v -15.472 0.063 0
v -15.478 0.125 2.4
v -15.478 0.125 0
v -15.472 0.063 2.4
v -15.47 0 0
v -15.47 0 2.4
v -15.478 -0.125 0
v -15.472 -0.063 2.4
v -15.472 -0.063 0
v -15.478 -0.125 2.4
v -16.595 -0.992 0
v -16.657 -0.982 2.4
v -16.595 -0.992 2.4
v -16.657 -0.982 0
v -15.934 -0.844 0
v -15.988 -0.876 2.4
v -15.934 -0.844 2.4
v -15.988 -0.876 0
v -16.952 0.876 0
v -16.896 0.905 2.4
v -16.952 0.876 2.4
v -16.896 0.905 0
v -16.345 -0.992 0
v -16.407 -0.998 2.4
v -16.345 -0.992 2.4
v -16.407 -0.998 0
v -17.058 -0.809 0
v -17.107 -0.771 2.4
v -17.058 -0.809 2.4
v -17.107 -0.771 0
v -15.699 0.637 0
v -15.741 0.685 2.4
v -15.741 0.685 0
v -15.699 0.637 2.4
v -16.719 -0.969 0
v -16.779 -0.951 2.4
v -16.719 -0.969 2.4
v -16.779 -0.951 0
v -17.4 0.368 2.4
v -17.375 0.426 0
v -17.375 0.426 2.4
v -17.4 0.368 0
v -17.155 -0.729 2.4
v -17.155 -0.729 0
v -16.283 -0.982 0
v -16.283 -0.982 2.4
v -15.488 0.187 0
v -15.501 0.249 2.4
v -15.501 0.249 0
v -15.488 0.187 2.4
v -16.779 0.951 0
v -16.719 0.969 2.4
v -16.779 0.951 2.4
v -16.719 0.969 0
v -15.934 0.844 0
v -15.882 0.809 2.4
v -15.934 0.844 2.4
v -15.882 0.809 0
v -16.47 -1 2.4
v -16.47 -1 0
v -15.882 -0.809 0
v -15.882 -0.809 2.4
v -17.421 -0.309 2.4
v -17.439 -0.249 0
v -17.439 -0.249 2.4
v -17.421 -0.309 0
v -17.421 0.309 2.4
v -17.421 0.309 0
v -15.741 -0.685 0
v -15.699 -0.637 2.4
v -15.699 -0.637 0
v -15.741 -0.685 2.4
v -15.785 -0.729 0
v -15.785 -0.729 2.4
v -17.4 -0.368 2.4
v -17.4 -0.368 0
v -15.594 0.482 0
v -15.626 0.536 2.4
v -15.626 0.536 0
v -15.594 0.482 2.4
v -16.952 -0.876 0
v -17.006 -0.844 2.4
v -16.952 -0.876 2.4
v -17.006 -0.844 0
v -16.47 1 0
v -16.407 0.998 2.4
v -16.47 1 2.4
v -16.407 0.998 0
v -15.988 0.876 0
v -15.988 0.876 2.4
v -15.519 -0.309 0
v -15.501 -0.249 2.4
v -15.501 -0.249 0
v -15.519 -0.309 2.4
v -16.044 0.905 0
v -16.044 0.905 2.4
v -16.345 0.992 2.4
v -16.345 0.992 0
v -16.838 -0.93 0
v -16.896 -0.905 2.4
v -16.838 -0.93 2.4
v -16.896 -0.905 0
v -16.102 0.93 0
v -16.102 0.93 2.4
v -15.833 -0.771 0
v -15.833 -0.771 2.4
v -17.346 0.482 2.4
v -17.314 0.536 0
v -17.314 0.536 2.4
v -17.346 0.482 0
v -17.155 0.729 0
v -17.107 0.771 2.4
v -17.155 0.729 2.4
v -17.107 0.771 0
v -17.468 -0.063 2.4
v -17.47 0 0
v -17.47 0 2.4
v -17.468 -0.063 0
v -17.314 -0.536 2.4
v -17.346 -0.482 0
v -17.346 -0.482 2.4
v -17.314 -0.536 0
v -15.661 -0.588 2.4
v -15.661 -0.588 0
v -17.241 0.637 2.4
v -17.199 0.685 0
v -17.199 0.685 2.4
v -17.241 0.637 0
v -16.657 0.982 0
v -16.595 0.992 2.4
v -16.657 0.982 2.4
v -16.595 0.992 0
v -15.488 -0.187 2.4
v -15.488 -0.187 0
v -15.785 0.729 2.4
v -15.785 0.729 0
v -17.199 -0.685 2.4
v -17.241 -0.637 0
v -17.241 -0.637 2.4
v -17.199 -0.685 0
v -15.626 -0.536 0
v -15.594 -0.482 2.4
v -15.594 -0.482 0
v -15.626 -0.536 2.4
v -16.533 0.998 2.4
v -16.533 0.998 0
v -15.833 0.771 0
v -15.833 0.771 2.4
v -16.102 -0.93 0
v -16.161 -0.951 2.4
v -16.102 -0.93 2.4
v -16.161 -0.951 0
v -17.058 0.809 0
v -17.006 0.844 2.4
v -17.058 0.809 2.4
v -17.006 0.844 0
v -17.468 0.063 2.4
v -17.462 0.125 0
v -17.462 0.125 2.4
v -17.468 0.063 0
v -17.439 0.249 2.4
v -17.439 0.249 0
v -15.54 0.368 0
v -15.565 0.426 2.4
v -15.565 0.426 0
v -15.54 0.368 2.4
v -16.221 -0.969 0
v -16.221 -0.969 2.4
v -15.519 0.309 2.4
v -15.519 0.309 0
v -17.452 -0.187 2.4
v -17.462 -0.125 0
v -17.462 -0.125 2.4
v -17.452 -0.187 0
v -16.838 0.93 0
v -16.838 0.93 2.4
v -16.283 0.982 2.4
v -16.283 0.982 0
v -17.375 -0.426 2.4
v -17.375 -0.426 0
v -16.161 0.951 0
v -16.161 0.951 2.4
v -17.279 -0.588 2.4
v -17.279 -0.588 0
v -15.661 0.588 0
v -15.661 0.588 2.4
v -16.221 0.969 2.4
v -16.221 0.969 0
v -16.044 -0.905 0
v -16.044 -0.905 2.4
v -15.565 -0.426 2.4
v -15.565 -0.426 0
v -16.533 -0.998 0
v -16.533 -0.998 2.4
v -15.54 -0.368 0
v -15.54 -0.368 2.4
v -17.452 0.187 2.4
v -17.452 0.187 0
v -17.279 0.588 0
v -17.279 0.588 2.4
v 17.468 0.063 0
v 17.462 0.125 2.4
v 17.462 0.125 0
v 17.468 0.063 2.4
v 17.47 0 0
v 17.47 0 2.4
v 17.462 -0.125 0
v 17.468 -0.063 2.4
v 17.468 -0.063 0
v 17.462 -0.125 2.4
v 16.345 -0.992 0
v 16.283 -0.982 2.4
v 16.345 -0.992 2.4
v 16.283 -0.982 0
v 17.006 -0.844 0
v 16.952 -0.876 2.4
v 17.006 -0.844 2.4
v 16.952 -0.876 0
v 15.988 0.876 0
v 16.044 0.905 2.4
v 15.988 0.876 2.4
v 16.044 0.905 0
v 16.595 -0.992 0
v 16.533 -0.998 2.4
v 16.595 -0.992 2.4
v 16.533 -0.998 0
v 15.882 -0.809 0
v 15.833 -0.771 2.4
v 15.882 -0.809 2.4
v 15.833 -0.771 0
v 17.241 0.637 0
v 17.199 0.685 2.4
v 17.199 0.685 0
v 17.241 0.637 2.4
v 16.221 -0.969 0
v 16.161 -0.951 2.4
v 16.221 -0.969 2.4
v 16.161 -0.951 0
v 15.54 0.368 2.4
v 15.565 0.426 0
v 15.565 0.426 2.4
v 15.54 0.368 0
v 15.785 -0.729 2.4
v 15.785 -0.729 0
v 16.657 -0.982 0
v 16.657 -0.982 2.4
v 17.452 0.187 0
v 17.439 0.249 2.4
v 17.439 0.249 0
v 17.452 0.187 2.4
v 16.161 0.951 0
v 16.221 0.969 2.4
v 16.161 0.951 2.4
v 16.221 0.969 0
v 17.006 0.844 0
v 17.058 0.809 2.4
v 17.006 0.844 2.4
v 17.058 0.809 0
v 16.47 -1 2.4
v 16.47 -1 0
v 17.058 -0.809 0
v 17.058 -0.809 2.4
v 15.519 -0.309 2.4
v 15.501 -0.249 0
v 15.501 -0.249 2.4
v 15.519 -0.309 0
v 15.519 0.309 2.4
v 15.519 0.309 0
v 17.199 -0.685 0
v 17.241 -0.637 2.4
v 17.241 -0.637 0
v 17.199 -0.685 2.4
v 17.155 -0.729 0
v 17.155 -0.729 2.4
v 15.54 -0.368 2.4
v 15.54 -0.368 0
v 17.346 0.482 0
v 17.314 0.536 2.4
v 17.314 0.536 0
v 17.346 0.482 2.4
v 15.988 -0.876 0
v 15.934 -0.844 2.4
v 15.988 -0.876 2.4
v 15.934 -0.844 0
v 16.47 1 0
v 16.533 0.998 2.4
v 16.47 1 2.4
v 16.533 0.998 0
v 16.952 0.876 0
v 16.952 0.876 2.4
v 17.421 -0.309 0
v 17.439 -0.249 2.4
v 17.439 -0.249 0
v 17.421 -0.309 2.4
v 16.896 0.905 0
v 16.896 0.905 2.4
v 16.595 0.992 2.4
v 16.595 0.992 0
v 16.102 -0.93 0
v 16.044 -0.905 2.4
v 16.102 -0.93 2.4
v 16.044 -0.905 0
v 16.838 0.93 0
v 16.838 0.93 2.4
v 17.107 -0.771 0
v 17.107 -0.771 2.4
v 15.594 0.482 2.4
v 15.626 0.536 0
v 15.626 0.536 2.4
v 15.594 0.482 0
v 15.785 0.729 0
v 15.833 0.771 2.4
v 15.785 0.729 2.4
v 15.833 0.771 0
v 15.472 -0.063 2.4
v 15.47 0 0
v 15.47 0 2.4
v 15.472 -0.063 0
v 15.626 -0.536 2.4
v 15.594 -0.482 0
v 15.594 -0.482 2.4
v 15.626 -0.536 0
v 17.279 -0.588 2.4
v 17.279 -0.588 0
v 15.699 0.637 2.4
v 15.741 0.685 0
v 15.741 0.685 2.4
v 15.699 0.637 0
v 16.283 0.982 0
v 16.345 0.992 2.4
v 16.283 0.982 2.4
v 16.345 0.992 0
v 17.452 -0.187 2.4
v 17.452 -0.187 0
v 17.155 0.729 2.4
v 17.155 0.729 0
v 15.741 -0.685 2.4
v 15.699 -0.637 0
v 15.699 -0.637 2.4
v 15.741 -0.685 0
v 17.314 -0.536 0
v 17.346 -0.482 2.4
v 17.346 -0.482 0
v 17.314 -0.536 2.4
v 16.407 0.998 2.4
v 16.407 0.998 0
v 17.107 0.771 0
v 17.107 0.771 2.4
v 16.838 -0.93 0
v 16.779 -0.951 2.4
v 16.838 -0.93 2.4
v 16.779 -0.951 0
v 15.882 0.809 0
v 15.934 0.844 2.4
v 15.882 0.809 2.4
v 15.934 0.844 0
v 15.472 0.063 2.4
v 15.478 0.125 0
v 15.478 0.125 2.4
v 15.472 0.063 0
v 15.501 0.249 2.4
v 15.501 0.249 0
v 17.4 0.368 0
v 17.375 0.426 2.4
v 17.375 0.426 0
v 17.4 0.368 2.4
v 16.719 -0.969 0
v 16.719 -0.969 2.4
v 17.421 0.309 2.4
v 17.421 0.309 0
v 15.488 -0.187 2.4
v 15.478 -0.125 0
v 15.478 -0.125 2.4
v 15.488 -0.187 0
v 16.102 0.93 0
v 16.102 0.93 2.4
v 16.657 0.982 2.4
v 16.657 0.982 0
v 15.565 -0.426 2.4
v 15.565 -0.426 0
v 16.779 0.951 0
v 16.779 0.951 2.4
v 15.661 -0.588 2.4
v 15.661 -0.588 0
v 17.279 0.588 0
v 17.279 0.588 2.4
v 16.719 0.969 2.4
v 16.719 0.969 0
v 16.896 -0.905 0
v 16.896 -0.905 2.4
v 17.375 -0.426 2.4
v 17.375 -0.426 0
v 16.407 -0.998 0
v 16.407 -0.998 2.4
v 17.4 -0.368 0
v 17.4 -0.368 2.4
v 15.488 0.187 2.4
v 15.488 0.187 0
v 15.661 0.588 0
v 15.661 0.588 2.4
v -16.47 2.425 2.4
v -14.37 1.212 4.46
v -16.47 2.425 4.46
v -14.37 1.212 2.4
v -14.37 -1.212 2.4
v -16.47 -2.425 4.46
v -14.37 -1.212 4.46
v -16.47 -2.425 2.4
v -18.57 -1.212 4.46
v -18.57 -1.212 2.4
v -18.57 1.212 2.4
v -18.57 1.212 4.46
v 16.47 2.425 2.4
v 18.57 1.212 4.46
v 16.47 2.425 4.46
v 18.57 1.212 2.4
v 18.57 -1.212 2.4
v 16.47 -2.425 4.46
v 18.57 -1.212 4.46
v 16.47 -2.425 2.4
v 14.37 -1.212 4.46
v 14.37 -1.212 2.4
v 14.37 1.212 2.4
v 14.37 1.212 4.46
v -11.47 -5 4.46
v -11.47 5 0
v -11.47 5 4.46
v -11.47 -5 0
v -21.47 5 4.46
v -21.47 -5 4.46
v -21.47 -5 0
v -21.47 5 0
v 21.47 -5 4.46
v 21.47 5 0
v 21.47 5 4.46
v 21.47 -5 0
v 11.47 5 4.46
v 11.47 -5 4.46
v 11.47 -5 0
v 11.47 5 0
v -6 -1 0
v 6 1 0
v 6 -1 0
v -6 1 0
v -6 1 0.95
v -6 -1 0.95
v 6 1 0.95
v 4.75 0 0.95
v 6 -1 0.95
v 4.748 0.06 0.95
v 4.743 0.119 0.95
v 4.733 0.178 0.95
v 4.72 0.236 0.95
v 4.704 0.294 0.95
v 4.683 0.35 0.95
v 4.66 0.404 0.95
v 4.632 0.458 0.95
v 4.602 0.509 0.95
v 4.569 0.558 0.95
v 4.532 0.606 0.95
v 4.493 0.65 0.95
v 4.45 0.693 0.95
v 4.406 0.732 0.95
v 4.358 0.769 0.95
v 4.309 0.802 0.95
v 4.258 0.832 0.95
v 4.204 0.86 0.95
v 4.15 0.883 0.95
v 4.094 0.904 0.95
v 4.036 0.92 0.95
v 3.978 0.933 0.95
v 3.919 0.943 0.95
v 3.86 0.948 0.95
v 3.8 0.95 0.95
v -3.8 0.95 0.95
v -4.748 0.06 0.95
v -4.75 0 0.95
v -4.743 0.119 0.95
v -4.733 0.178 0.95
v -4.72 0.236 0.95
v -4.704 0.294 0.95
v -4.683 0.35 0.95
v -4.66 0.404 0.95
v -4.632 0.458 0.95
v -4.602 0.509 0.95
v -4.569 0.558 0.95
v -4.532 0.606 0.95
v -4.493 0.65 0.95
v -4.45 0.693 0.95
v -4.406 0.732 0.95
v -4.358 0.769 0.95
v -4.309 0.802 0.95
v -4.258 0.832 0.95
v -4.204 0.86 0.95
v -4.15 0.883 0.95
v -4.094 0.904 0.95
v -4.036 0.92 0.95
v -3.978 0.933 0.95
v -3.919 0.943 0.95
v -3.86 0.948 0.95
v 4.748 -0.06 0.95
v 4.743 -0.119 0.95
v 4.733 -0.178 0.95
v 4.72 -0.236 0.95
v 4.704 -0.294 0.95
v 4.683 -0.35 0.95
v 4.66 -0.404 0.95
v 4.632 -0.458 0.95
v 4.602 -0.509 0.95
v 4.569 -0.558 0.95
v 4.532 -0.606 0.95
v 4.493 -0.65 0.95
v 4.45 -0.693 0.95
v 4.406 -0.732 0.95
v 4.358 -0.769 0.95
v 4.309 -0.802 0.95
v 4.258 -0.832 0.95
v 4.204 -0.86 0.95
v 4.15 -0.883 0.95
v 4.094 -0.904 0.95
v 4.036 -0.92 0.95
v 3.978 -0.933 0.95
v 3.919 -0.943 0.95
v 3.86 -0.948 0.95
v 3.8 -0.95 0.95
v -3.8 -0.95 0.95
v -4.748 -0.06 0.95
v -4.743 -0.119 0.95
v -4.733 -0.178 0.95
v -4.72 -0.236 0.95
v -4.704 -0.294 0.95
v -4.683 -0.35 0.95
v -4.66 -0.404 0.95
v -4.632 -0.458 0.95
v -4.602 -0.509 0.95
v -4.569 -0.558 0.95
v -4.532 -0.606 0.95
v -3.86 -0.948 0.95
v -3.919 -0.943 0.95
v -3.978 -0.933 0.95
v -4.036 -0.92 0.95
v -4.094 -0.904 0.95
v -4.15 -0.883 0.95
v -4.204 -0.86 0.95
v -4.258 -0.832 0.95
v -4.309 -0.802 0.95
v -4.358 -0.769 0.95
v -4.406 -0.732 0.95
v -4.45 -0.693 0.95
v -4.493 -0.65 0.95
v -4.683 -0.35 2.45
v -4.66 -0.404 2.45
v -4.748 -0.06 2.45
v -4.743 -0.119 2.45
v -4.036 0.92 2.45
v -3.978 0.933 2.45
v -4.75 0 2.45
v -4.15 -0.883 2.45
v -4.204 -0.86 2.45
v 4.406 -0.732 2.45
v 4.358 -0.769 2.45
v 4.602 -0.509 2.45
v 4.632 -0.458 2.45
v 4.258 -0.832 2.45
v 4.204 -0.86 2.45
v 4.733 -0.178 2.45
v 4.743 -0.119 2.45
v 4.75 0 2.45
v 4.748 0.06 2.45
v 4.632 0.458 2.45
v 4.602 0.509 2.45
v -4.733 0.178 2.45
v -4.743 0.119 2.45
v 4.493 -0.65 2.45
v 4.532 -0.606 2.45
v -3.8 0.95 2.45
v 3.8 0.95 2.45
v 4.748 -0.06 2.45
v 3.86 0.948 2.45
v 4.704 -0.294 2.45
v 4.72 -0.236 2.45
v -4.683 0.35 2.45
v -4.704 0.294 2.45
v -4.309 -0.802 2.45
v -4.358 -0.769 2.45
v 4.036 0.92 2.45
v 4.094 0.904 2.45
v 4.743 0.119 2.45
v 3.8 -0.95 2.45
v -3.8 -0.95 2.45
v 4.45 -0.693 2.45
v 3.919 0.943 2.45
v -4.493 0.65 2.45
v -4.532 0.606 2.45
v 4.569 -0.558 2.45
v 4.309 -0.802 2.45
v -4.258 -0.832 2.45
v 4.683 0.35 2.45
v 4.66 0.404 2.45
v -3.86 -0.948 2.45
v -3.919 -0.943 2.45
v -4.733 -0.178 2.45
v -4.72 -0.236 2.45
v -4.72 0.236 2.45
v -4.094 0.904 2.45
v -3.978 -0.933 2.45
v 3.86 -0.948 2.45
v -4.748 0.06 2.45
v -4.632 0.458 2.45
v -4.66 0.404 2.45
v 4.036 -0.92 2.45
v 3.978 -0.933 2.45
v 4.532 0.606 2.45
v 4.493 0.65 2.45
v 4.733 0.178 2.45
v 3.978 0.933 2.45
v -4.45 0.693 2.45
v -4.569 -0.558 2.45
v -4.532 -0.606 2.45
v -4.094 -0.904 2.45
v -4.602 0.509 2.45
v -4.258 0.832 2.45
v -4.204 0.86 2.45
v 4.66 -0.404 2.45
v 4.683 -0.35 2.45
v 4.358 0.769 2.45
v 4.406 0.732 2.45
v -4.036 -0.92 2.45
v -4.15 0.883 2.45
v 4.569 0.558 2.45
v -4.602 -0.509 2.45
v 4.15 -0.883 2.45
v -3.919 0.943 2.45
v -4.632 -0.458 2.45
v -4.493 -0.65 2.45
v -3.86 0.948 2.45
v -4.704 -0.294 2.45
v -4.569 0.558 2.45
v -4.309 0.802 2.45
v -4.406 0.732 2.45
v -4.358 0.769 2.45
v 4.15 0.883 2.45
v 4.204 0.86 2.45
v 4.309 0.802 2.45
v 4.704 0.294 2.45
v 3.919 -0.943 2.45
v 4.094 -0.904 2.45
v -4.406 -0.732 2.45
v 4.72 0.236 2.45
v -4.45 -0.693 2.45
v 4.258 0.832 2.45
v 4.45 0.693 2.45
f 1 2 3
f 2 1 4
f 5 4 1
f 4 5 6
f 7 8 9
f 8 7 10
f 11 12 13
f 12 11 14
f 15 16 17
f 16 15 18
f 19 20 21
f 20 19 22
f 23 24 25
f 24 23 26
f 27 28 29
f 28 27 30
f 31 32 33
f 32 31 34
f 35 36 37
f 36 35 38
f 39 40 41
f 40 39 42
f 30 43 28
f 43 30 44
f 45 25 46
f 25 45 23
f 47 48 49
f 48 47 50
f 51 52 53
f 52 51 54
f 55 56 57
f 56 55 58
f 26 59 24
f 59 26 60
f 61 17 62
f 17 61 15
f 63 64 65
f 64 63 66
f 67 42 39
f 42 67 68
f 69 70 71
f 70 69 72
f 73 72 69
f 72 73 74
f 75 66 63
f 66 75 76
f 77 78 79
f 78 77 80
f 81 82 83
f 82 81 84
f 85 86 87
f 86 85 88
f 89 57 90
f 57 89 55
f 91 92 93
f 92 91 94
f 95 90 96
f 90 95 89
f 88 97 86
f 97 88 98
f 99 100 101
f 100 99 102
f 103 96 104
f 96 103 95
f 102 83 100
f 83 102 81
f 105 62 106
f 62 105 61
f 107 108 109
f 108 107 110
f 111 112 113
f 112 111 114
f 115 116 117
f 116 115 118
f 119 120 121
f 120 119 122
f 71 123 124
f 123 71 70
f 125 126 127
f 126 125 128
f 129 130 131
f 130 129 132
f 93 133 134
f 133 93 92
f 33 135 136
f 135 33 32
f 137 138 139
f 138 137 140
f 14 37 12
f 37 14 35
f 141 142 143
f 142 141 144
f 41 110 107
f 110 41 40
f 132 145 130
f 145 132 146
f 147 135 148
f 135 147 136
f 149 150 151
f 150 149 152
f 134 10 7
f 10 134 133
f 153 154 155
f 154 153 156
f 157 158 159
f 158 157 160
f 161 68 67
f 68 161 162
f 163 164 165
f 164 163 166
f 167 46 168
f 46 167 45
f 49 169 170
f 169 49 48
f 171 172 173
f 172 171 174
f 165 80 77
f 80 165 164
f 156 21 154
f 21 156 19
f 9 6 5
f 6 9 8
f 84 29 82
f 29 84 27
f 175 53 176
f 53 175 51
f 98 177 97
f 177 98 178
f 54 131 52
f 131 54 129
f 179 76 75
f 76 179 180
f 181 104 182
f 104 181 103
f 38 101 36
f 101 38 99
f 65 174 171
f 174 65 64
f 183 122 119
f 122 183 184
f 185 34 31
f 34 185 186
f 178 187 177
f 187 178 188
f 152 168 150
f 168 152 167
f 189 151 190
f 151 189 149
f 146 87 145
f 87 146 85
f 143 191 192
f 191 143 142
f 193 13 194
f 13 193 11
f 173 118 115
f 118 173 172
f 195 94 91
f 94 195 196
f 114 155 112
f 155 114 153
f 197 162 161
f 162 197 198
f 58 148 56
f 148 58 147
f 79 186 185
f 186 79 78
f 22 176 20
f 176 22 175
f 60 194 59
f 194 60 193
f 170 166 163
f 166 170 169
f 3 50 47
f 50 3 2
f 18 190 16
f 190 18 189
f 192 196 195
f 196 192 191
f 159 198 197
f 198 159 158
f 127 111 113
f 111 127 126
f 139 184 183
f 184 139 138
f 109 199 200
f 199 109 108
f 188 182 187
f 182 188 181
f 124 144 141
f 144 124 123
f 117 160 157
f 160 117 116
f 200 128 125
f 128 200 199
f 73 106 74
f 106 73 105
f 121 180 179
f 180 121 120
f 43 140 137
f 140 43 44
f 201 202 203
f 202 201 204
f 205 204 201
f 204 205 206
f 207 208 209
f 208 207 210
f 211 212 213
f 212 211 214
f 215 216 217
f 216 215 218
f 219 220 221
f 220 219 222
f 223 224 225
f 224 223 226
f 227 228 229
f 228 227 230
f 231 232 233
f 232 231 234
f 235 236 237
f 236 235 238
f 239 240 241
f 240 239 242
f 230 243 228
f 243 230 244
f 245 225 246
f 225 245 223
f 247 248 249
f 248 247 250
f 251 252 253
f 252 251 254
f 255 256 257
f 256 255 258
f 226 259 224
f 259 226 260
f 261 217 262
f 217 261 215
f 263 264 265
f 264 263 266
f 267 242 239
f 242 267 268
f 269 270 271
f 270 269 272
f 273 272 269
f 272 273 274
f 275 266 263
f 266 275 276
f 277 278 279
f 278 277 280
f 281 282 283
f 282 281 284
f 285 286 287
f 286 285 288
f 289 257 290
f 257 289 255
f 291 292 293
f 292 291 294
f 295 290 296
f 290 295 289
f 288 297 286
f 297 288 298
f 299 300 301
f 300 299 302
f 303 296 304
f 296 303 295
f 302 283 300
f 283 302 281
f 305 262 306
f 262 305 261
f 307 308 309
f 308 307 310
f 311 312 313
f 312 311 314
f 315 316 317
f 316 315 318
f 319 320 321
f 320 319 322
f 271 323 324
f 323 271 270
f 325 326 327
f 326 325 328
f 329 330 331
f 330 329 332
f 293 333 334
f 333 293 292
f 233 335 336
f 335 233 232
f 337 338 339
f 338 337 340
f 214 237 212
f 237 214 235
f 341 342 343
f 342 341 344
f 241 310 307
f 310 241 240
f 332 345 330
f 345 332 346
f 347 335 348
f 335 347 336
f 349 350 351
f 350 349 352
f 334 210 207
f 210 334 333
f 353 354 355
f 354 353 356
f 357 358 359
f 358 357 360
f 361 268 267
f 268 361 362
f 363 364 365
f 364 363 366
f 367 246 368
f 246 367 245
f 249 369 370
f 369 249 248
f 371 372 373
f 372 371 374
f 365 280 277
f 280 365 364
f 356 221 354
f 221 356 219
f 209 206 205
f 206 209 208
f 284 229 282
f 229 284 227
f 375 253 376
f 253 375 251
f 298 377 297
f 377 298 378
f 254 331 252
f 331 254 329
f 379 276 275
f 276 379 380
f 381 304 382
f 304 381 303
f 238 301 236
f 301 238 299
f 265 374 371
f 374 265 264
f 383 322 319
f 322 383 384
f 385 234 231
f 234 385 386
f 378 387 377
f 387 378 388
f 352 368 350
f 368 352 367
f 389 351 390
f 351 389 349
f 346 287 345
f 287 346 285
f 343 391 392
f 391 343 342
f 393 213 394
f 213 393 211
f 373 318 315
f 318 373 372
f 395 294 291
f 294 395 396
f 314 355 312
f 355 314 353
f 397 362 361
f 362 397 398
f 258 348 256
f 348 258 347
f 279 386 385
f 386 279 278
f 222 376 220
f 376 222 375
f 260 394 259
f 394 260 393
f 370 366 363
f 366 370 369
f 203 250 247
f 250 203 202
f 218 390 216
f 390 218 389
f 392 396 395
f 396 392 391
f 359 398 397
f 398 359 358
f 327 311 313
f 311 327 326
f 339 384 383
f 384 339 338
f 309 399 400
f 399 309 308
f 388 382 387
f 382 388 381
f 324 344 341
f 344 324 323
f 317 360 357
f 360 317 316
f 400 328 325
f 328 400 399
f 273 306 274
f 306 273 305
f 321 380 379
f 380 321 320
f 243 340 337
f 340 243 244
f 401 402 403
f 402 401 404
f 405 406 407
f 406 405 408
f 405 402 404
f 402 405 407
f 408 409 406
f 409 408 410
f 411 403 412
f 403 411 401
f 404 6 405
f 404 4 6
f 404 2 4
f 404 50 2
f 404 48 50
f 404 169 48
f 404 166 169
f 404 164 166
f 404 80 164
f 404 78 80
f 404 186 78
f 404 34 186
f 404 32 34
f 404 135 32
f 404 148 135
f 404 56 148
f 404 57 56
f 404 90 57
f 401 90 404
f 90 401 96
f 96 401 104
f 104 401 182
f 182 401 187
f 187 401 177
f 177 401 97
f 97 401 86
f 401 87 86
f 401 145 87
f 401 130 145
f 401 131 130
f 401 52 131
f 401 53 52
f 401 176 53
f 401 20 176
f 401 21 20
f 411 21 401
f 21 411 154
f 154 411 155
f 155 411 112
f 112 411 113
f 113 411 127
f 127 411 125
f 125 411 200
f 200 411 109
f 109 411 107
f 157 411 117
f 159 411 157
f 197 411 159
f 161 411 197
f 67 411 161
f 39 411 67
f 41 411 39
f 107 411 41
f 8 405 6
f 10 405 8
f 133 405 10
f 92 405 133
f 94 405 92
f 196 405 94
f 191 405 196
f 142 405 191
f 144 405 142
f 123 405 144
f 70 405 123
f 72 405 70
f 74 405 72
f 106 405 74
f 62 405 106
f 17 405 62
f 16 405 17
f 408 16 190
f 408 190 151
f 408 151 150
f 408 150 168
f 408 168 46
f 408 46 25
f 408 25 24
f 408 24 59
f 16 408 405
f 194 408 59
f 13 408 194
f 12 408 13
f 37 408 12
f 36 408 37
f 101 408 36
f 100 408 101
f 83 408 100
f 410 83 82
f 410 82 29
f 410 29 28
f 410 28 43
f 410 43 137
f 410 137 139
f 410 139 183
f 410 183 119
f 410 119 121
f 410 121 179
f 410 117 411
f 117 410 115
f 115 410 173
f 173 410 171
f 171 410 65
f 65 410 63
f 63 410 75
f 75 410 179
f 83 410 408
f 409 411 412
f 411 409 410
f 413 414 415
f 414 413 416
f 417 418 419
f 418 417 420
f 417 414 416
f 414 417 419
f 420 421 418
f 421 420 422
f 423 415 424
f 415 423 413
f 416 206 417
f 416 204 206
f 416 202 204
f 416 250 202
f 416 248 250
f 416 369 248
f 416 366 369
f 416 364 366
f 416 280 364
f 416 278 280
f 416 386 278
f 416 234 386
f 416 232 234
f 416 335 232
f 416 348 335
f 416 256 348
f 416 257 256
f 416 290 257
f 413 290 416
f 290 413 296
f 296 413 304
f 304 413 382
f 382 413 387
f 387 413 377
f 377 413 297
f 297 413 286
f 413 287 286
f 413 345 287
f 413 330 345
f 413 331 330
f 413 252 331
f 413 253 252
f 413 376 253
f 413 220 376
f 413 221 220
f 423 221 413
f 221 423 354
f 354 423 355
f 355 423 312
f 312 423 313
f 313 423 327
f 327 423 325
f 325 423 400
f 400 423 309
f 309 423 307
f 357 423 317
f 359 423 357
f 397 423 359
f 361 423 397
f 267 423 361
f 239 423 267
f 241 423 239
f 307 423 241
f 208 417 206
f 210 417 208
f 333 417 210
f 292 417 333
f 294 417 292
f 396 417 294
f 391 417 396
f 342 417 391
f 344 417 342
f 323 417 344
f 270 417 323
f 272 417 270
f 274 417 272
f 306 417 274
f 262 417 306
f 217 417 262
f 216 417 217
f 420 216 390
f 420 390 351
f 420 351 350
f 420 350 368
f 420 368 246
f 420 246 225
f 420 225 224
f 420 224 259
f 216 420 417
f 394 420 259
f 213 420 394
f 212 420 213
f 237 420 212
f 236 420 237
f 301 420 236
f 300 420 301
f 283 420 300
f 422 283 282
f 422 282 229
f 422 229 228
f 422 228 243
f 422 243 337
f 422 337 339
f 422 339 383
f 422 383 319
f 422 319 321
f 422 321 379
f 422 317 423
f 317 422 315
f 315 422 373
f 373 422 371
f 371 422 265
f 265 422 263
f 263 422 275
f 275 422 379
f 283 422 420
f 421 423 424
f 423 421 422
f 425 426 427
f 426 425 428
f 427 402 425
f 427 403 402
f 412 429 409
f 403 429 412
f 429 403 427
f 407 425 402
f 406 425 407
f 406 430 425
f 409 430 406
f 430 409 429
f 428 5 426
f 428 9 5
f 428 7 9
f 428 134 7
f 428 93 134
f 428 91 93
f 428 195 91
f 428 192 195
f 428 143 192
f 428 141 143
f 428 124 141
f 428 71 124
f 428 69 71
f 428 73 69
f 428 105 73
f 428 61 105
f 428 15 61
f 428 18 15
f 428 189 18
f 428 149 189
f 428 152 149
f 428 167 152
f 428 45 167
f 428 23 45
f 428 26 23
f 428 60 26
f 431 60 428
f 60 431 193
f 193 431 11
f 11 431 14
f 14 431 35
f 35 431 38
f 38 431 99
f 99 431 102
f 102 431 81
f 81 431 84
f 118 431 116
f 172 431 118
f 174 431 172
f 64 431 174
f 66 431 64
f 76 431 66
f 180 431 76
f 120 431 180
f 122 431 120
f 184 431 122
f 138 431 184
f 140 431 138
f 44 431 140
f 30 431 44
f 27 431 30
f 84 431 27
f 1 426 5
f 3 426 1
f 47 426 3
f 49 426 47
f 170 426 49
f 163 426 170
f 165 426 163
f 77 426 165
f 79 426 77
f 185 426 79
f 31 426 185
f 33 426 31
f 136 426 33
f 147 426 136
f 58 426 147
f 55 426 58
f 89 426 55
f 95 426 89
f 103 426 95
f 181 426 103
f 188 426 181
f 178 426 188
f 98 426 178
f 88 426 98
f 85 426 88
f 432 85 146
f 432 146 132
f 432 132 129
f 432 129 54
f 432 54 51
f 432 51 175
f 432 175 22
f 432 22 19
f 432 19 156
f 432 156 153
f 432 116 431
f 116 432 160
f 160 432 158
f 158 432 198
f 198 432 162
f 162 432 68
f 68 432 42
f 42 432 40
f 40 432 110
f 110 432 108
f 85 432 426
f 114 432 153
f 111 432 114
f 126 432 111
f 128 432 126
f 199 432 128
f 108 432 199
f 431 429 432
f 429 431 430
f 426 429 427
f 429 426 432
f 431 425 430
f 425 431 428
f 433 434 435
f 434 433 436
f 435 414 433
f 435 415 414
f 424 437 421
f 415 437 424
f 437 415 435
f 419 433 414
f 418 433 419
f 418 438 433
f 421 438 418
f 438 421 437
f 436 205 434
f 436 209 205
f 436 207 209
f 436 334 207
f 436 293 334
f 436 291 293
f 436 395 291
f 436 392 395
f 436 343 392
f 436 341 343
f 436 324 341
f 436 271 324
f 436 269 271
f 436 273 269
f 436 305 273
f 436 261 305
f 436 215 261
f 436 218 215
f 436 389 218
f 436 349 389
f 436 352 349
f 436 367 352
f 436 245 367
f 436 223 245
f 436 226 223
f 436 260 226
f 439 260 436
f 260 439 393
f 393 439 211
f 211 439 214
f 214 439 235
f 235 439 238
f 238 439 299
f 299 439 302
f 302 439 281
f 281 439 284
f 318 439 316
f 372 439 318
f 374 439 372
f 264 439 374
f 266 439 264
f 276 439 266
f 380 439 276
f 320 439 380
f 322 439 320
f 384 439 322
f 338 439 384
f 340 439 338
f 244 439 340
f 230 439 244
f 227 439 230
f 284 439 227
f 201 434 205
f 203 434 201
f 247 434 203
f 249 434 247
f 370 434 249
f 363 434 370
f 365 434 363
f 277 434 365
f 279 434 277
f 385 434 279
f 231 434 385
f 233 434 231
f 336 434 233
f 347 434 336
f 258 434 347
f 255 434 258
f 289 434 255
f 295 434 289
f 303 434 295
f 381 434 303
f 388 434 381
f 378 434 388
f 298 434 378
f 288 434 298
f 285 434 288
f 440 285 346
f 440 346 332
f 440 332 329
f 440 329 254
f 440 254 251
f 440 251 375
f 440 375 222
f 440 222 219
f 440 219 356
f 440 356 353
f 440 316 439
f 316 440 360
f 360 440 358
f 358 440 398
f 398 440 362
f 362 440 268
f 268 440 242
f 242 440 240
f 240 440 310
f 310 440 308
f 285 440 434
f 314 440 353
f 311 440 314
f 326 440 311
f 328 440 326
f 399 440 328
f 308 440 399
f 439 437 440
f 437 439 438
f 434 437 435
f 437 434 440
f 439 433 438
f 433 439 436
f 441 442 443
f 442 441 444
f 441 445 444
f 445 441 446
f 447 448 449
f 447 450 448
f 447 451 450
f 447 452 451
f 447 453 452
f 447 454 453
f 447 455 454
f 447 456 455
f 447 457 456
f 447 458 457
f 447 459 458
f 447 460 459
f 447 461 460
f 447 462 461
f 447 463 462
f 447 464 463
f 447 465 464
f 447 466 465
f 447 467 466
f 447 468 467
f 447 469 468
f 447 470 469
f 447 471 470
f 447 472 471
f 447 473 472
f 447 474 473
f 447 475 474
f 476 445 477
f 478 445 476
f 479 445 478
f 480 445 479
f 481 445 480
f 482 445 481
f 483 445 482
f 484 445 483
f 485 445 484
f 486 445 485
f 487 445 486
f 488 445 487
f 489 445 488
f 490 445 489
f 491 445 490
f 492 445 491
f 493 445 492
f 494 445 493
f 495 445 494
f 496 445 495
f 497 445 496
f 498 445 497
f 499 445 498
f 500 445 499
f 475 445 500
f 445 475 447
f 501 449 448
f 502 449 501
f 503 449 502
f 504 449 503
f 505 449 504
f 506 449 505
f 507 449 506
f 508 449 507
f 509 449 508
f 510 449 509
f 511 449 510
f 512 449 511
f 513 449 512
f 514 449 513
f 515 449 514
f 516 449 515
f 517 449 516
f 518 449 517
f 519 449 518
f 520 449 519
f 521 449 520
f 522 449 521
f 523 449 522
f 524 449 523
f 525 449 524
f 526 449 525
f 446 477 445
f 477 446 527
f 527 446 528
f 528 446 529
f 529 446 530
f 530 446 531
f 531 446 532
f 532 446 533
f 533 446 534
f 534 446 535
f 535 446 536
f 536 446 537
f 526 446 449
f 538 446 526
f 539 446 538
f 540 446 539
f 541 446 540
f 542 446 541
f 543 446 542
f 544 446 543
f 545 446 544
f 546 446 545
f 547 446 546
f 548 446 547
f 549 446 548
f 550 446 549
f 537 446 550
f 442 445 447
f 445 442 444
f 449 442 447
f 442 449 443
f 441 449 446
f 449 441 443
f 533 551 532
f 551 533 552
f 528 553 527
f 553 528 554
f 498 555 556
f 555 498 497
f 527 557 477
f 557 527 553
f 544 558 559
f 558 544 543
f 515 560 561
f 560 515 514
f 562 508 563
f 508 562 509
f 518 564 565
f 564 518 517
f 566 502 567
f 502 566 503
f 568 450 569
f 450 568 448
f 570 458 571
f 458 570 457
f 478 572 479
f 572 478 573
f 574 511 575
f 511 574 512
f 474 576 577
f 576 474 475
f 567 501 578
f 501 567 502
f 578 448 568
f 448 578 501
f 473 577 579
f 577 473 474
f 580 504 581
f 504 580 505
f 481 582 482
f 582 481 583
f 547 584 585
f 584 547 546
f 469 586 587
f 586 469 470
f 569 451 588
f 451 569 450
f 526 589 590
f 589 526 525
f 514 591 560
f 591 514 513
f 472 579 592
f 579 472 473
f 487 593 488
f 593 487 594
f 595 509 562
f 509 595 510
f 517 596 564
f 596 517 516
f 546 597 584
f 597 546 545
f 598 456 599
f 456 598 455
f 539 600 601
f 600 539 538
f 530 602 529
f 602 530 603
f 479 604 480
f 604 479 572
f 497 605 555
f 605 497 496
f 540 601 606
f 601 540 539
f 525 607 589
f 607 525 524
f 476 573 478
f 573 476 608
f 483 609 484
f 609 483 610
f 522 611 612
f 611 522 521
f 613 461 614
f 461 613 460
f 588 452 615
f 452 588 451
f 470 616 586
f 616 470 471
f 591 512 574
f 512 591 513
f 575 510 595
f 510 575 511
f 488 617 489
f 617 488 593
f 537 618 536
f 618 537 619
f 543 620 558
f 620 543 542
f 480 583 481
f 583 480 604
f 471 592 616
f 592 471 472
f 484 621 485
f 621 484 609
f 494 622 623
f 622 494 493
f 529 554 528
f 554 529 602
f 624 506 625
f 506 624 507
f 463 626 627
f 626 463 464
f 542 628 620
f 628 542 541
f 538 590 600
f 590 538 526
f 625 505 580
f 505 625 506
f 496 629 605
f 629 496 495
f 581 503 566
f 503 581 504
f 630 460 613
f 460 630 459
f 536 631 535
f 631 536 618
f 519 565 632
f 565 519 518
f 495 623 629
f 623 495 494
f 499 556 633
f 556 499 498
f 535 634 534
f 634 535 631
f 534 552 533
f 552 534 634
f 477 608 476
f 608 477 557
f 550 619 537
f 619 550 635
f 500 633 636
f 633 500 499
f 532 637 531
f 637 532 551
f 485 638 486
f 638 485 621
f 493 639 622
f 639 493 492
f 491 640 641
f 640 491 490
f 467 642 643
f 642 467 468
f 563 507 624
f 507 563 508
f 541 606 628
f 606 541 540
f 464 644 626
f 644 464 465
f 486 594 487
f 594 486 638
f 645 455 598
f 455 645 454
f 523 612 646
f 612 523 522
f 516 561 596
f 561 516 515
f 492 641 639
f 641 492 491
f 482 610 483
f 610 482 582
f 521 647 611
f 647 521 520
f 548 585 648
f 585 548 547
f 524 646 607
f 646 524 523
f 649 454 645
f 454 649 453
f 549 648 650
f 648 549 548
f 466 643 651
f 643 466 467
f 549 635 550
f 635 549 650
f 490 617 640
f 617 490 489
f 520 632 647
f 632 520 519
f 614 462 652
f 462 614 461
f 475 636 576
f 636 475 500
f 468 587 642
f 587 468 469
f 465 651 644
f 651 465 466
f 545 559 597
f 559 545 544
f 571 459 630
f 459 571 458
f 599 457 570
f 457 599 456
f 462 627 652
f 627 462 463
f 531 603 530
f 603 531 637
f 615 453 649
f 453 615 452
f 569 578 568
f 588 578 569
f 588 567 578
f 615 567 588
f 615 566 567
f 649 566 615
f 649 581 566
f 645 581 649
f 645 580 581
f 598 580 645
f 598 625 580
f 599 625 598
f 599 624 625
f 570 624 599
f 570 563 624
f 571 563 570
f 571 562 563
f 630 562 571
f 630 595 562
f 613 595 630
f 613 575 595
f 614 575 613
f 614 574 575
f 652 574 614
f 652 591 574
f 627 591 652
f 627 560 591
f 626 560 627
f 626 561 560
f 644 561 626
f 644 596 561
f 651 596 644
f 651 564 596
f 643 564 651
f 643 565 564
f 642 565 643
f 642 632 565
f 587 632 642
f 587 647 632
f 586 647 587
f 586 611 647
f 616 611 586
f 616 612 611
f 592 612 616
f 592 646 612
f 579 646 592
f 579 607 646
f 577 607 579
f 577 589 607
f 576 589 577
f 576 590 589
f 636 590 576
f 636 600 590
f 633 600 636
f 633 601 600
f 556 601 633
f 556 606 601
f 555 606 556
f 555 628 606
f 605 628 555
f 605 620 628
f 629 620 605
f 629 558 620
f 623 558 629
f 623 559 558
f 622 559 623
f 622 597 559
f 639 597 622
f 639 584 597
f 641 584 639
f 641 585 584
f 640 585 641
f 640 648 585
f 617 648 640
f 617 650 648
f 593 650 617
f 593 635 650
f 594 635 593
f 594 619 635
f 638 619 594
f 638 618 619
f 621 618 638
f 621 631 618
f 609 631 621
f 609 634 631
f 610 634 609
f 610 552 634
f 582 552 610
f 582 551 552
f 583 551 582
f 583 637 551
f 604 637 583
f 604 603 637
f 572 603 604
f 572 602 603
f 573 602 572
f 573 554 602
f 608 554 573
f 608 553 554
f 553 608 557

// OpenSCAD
/*
* Copyright 2014 Jonas Hagmar
*
* This file is part of keynjector.
*
* keynjector is free software: you can redistribute it and/or modify
* it under the terms of the GNU General Public License as published by
* the Free Software Foundation, either version 2 of the License, or
* (at your option) any later version.
*
* keynjector is distributed in the hope that it will be useful,
* but WITHOUT ANY WARRANTY; without even the implied warranty of
* MERCHANTABILITY or FITNESS FOR A PARTICULAR PURPOSE.  See the
* GNU General Public License for more details.
*
* You should have received a copy of the GNU General Public License
* along with keynjector.  If not, see <http://www.gnu.org/licenses/>.
*/

use <keynjector-case.scad>;

/***** Renders *****/

$fn=100;

holder_normalized();

btn_normalized();
